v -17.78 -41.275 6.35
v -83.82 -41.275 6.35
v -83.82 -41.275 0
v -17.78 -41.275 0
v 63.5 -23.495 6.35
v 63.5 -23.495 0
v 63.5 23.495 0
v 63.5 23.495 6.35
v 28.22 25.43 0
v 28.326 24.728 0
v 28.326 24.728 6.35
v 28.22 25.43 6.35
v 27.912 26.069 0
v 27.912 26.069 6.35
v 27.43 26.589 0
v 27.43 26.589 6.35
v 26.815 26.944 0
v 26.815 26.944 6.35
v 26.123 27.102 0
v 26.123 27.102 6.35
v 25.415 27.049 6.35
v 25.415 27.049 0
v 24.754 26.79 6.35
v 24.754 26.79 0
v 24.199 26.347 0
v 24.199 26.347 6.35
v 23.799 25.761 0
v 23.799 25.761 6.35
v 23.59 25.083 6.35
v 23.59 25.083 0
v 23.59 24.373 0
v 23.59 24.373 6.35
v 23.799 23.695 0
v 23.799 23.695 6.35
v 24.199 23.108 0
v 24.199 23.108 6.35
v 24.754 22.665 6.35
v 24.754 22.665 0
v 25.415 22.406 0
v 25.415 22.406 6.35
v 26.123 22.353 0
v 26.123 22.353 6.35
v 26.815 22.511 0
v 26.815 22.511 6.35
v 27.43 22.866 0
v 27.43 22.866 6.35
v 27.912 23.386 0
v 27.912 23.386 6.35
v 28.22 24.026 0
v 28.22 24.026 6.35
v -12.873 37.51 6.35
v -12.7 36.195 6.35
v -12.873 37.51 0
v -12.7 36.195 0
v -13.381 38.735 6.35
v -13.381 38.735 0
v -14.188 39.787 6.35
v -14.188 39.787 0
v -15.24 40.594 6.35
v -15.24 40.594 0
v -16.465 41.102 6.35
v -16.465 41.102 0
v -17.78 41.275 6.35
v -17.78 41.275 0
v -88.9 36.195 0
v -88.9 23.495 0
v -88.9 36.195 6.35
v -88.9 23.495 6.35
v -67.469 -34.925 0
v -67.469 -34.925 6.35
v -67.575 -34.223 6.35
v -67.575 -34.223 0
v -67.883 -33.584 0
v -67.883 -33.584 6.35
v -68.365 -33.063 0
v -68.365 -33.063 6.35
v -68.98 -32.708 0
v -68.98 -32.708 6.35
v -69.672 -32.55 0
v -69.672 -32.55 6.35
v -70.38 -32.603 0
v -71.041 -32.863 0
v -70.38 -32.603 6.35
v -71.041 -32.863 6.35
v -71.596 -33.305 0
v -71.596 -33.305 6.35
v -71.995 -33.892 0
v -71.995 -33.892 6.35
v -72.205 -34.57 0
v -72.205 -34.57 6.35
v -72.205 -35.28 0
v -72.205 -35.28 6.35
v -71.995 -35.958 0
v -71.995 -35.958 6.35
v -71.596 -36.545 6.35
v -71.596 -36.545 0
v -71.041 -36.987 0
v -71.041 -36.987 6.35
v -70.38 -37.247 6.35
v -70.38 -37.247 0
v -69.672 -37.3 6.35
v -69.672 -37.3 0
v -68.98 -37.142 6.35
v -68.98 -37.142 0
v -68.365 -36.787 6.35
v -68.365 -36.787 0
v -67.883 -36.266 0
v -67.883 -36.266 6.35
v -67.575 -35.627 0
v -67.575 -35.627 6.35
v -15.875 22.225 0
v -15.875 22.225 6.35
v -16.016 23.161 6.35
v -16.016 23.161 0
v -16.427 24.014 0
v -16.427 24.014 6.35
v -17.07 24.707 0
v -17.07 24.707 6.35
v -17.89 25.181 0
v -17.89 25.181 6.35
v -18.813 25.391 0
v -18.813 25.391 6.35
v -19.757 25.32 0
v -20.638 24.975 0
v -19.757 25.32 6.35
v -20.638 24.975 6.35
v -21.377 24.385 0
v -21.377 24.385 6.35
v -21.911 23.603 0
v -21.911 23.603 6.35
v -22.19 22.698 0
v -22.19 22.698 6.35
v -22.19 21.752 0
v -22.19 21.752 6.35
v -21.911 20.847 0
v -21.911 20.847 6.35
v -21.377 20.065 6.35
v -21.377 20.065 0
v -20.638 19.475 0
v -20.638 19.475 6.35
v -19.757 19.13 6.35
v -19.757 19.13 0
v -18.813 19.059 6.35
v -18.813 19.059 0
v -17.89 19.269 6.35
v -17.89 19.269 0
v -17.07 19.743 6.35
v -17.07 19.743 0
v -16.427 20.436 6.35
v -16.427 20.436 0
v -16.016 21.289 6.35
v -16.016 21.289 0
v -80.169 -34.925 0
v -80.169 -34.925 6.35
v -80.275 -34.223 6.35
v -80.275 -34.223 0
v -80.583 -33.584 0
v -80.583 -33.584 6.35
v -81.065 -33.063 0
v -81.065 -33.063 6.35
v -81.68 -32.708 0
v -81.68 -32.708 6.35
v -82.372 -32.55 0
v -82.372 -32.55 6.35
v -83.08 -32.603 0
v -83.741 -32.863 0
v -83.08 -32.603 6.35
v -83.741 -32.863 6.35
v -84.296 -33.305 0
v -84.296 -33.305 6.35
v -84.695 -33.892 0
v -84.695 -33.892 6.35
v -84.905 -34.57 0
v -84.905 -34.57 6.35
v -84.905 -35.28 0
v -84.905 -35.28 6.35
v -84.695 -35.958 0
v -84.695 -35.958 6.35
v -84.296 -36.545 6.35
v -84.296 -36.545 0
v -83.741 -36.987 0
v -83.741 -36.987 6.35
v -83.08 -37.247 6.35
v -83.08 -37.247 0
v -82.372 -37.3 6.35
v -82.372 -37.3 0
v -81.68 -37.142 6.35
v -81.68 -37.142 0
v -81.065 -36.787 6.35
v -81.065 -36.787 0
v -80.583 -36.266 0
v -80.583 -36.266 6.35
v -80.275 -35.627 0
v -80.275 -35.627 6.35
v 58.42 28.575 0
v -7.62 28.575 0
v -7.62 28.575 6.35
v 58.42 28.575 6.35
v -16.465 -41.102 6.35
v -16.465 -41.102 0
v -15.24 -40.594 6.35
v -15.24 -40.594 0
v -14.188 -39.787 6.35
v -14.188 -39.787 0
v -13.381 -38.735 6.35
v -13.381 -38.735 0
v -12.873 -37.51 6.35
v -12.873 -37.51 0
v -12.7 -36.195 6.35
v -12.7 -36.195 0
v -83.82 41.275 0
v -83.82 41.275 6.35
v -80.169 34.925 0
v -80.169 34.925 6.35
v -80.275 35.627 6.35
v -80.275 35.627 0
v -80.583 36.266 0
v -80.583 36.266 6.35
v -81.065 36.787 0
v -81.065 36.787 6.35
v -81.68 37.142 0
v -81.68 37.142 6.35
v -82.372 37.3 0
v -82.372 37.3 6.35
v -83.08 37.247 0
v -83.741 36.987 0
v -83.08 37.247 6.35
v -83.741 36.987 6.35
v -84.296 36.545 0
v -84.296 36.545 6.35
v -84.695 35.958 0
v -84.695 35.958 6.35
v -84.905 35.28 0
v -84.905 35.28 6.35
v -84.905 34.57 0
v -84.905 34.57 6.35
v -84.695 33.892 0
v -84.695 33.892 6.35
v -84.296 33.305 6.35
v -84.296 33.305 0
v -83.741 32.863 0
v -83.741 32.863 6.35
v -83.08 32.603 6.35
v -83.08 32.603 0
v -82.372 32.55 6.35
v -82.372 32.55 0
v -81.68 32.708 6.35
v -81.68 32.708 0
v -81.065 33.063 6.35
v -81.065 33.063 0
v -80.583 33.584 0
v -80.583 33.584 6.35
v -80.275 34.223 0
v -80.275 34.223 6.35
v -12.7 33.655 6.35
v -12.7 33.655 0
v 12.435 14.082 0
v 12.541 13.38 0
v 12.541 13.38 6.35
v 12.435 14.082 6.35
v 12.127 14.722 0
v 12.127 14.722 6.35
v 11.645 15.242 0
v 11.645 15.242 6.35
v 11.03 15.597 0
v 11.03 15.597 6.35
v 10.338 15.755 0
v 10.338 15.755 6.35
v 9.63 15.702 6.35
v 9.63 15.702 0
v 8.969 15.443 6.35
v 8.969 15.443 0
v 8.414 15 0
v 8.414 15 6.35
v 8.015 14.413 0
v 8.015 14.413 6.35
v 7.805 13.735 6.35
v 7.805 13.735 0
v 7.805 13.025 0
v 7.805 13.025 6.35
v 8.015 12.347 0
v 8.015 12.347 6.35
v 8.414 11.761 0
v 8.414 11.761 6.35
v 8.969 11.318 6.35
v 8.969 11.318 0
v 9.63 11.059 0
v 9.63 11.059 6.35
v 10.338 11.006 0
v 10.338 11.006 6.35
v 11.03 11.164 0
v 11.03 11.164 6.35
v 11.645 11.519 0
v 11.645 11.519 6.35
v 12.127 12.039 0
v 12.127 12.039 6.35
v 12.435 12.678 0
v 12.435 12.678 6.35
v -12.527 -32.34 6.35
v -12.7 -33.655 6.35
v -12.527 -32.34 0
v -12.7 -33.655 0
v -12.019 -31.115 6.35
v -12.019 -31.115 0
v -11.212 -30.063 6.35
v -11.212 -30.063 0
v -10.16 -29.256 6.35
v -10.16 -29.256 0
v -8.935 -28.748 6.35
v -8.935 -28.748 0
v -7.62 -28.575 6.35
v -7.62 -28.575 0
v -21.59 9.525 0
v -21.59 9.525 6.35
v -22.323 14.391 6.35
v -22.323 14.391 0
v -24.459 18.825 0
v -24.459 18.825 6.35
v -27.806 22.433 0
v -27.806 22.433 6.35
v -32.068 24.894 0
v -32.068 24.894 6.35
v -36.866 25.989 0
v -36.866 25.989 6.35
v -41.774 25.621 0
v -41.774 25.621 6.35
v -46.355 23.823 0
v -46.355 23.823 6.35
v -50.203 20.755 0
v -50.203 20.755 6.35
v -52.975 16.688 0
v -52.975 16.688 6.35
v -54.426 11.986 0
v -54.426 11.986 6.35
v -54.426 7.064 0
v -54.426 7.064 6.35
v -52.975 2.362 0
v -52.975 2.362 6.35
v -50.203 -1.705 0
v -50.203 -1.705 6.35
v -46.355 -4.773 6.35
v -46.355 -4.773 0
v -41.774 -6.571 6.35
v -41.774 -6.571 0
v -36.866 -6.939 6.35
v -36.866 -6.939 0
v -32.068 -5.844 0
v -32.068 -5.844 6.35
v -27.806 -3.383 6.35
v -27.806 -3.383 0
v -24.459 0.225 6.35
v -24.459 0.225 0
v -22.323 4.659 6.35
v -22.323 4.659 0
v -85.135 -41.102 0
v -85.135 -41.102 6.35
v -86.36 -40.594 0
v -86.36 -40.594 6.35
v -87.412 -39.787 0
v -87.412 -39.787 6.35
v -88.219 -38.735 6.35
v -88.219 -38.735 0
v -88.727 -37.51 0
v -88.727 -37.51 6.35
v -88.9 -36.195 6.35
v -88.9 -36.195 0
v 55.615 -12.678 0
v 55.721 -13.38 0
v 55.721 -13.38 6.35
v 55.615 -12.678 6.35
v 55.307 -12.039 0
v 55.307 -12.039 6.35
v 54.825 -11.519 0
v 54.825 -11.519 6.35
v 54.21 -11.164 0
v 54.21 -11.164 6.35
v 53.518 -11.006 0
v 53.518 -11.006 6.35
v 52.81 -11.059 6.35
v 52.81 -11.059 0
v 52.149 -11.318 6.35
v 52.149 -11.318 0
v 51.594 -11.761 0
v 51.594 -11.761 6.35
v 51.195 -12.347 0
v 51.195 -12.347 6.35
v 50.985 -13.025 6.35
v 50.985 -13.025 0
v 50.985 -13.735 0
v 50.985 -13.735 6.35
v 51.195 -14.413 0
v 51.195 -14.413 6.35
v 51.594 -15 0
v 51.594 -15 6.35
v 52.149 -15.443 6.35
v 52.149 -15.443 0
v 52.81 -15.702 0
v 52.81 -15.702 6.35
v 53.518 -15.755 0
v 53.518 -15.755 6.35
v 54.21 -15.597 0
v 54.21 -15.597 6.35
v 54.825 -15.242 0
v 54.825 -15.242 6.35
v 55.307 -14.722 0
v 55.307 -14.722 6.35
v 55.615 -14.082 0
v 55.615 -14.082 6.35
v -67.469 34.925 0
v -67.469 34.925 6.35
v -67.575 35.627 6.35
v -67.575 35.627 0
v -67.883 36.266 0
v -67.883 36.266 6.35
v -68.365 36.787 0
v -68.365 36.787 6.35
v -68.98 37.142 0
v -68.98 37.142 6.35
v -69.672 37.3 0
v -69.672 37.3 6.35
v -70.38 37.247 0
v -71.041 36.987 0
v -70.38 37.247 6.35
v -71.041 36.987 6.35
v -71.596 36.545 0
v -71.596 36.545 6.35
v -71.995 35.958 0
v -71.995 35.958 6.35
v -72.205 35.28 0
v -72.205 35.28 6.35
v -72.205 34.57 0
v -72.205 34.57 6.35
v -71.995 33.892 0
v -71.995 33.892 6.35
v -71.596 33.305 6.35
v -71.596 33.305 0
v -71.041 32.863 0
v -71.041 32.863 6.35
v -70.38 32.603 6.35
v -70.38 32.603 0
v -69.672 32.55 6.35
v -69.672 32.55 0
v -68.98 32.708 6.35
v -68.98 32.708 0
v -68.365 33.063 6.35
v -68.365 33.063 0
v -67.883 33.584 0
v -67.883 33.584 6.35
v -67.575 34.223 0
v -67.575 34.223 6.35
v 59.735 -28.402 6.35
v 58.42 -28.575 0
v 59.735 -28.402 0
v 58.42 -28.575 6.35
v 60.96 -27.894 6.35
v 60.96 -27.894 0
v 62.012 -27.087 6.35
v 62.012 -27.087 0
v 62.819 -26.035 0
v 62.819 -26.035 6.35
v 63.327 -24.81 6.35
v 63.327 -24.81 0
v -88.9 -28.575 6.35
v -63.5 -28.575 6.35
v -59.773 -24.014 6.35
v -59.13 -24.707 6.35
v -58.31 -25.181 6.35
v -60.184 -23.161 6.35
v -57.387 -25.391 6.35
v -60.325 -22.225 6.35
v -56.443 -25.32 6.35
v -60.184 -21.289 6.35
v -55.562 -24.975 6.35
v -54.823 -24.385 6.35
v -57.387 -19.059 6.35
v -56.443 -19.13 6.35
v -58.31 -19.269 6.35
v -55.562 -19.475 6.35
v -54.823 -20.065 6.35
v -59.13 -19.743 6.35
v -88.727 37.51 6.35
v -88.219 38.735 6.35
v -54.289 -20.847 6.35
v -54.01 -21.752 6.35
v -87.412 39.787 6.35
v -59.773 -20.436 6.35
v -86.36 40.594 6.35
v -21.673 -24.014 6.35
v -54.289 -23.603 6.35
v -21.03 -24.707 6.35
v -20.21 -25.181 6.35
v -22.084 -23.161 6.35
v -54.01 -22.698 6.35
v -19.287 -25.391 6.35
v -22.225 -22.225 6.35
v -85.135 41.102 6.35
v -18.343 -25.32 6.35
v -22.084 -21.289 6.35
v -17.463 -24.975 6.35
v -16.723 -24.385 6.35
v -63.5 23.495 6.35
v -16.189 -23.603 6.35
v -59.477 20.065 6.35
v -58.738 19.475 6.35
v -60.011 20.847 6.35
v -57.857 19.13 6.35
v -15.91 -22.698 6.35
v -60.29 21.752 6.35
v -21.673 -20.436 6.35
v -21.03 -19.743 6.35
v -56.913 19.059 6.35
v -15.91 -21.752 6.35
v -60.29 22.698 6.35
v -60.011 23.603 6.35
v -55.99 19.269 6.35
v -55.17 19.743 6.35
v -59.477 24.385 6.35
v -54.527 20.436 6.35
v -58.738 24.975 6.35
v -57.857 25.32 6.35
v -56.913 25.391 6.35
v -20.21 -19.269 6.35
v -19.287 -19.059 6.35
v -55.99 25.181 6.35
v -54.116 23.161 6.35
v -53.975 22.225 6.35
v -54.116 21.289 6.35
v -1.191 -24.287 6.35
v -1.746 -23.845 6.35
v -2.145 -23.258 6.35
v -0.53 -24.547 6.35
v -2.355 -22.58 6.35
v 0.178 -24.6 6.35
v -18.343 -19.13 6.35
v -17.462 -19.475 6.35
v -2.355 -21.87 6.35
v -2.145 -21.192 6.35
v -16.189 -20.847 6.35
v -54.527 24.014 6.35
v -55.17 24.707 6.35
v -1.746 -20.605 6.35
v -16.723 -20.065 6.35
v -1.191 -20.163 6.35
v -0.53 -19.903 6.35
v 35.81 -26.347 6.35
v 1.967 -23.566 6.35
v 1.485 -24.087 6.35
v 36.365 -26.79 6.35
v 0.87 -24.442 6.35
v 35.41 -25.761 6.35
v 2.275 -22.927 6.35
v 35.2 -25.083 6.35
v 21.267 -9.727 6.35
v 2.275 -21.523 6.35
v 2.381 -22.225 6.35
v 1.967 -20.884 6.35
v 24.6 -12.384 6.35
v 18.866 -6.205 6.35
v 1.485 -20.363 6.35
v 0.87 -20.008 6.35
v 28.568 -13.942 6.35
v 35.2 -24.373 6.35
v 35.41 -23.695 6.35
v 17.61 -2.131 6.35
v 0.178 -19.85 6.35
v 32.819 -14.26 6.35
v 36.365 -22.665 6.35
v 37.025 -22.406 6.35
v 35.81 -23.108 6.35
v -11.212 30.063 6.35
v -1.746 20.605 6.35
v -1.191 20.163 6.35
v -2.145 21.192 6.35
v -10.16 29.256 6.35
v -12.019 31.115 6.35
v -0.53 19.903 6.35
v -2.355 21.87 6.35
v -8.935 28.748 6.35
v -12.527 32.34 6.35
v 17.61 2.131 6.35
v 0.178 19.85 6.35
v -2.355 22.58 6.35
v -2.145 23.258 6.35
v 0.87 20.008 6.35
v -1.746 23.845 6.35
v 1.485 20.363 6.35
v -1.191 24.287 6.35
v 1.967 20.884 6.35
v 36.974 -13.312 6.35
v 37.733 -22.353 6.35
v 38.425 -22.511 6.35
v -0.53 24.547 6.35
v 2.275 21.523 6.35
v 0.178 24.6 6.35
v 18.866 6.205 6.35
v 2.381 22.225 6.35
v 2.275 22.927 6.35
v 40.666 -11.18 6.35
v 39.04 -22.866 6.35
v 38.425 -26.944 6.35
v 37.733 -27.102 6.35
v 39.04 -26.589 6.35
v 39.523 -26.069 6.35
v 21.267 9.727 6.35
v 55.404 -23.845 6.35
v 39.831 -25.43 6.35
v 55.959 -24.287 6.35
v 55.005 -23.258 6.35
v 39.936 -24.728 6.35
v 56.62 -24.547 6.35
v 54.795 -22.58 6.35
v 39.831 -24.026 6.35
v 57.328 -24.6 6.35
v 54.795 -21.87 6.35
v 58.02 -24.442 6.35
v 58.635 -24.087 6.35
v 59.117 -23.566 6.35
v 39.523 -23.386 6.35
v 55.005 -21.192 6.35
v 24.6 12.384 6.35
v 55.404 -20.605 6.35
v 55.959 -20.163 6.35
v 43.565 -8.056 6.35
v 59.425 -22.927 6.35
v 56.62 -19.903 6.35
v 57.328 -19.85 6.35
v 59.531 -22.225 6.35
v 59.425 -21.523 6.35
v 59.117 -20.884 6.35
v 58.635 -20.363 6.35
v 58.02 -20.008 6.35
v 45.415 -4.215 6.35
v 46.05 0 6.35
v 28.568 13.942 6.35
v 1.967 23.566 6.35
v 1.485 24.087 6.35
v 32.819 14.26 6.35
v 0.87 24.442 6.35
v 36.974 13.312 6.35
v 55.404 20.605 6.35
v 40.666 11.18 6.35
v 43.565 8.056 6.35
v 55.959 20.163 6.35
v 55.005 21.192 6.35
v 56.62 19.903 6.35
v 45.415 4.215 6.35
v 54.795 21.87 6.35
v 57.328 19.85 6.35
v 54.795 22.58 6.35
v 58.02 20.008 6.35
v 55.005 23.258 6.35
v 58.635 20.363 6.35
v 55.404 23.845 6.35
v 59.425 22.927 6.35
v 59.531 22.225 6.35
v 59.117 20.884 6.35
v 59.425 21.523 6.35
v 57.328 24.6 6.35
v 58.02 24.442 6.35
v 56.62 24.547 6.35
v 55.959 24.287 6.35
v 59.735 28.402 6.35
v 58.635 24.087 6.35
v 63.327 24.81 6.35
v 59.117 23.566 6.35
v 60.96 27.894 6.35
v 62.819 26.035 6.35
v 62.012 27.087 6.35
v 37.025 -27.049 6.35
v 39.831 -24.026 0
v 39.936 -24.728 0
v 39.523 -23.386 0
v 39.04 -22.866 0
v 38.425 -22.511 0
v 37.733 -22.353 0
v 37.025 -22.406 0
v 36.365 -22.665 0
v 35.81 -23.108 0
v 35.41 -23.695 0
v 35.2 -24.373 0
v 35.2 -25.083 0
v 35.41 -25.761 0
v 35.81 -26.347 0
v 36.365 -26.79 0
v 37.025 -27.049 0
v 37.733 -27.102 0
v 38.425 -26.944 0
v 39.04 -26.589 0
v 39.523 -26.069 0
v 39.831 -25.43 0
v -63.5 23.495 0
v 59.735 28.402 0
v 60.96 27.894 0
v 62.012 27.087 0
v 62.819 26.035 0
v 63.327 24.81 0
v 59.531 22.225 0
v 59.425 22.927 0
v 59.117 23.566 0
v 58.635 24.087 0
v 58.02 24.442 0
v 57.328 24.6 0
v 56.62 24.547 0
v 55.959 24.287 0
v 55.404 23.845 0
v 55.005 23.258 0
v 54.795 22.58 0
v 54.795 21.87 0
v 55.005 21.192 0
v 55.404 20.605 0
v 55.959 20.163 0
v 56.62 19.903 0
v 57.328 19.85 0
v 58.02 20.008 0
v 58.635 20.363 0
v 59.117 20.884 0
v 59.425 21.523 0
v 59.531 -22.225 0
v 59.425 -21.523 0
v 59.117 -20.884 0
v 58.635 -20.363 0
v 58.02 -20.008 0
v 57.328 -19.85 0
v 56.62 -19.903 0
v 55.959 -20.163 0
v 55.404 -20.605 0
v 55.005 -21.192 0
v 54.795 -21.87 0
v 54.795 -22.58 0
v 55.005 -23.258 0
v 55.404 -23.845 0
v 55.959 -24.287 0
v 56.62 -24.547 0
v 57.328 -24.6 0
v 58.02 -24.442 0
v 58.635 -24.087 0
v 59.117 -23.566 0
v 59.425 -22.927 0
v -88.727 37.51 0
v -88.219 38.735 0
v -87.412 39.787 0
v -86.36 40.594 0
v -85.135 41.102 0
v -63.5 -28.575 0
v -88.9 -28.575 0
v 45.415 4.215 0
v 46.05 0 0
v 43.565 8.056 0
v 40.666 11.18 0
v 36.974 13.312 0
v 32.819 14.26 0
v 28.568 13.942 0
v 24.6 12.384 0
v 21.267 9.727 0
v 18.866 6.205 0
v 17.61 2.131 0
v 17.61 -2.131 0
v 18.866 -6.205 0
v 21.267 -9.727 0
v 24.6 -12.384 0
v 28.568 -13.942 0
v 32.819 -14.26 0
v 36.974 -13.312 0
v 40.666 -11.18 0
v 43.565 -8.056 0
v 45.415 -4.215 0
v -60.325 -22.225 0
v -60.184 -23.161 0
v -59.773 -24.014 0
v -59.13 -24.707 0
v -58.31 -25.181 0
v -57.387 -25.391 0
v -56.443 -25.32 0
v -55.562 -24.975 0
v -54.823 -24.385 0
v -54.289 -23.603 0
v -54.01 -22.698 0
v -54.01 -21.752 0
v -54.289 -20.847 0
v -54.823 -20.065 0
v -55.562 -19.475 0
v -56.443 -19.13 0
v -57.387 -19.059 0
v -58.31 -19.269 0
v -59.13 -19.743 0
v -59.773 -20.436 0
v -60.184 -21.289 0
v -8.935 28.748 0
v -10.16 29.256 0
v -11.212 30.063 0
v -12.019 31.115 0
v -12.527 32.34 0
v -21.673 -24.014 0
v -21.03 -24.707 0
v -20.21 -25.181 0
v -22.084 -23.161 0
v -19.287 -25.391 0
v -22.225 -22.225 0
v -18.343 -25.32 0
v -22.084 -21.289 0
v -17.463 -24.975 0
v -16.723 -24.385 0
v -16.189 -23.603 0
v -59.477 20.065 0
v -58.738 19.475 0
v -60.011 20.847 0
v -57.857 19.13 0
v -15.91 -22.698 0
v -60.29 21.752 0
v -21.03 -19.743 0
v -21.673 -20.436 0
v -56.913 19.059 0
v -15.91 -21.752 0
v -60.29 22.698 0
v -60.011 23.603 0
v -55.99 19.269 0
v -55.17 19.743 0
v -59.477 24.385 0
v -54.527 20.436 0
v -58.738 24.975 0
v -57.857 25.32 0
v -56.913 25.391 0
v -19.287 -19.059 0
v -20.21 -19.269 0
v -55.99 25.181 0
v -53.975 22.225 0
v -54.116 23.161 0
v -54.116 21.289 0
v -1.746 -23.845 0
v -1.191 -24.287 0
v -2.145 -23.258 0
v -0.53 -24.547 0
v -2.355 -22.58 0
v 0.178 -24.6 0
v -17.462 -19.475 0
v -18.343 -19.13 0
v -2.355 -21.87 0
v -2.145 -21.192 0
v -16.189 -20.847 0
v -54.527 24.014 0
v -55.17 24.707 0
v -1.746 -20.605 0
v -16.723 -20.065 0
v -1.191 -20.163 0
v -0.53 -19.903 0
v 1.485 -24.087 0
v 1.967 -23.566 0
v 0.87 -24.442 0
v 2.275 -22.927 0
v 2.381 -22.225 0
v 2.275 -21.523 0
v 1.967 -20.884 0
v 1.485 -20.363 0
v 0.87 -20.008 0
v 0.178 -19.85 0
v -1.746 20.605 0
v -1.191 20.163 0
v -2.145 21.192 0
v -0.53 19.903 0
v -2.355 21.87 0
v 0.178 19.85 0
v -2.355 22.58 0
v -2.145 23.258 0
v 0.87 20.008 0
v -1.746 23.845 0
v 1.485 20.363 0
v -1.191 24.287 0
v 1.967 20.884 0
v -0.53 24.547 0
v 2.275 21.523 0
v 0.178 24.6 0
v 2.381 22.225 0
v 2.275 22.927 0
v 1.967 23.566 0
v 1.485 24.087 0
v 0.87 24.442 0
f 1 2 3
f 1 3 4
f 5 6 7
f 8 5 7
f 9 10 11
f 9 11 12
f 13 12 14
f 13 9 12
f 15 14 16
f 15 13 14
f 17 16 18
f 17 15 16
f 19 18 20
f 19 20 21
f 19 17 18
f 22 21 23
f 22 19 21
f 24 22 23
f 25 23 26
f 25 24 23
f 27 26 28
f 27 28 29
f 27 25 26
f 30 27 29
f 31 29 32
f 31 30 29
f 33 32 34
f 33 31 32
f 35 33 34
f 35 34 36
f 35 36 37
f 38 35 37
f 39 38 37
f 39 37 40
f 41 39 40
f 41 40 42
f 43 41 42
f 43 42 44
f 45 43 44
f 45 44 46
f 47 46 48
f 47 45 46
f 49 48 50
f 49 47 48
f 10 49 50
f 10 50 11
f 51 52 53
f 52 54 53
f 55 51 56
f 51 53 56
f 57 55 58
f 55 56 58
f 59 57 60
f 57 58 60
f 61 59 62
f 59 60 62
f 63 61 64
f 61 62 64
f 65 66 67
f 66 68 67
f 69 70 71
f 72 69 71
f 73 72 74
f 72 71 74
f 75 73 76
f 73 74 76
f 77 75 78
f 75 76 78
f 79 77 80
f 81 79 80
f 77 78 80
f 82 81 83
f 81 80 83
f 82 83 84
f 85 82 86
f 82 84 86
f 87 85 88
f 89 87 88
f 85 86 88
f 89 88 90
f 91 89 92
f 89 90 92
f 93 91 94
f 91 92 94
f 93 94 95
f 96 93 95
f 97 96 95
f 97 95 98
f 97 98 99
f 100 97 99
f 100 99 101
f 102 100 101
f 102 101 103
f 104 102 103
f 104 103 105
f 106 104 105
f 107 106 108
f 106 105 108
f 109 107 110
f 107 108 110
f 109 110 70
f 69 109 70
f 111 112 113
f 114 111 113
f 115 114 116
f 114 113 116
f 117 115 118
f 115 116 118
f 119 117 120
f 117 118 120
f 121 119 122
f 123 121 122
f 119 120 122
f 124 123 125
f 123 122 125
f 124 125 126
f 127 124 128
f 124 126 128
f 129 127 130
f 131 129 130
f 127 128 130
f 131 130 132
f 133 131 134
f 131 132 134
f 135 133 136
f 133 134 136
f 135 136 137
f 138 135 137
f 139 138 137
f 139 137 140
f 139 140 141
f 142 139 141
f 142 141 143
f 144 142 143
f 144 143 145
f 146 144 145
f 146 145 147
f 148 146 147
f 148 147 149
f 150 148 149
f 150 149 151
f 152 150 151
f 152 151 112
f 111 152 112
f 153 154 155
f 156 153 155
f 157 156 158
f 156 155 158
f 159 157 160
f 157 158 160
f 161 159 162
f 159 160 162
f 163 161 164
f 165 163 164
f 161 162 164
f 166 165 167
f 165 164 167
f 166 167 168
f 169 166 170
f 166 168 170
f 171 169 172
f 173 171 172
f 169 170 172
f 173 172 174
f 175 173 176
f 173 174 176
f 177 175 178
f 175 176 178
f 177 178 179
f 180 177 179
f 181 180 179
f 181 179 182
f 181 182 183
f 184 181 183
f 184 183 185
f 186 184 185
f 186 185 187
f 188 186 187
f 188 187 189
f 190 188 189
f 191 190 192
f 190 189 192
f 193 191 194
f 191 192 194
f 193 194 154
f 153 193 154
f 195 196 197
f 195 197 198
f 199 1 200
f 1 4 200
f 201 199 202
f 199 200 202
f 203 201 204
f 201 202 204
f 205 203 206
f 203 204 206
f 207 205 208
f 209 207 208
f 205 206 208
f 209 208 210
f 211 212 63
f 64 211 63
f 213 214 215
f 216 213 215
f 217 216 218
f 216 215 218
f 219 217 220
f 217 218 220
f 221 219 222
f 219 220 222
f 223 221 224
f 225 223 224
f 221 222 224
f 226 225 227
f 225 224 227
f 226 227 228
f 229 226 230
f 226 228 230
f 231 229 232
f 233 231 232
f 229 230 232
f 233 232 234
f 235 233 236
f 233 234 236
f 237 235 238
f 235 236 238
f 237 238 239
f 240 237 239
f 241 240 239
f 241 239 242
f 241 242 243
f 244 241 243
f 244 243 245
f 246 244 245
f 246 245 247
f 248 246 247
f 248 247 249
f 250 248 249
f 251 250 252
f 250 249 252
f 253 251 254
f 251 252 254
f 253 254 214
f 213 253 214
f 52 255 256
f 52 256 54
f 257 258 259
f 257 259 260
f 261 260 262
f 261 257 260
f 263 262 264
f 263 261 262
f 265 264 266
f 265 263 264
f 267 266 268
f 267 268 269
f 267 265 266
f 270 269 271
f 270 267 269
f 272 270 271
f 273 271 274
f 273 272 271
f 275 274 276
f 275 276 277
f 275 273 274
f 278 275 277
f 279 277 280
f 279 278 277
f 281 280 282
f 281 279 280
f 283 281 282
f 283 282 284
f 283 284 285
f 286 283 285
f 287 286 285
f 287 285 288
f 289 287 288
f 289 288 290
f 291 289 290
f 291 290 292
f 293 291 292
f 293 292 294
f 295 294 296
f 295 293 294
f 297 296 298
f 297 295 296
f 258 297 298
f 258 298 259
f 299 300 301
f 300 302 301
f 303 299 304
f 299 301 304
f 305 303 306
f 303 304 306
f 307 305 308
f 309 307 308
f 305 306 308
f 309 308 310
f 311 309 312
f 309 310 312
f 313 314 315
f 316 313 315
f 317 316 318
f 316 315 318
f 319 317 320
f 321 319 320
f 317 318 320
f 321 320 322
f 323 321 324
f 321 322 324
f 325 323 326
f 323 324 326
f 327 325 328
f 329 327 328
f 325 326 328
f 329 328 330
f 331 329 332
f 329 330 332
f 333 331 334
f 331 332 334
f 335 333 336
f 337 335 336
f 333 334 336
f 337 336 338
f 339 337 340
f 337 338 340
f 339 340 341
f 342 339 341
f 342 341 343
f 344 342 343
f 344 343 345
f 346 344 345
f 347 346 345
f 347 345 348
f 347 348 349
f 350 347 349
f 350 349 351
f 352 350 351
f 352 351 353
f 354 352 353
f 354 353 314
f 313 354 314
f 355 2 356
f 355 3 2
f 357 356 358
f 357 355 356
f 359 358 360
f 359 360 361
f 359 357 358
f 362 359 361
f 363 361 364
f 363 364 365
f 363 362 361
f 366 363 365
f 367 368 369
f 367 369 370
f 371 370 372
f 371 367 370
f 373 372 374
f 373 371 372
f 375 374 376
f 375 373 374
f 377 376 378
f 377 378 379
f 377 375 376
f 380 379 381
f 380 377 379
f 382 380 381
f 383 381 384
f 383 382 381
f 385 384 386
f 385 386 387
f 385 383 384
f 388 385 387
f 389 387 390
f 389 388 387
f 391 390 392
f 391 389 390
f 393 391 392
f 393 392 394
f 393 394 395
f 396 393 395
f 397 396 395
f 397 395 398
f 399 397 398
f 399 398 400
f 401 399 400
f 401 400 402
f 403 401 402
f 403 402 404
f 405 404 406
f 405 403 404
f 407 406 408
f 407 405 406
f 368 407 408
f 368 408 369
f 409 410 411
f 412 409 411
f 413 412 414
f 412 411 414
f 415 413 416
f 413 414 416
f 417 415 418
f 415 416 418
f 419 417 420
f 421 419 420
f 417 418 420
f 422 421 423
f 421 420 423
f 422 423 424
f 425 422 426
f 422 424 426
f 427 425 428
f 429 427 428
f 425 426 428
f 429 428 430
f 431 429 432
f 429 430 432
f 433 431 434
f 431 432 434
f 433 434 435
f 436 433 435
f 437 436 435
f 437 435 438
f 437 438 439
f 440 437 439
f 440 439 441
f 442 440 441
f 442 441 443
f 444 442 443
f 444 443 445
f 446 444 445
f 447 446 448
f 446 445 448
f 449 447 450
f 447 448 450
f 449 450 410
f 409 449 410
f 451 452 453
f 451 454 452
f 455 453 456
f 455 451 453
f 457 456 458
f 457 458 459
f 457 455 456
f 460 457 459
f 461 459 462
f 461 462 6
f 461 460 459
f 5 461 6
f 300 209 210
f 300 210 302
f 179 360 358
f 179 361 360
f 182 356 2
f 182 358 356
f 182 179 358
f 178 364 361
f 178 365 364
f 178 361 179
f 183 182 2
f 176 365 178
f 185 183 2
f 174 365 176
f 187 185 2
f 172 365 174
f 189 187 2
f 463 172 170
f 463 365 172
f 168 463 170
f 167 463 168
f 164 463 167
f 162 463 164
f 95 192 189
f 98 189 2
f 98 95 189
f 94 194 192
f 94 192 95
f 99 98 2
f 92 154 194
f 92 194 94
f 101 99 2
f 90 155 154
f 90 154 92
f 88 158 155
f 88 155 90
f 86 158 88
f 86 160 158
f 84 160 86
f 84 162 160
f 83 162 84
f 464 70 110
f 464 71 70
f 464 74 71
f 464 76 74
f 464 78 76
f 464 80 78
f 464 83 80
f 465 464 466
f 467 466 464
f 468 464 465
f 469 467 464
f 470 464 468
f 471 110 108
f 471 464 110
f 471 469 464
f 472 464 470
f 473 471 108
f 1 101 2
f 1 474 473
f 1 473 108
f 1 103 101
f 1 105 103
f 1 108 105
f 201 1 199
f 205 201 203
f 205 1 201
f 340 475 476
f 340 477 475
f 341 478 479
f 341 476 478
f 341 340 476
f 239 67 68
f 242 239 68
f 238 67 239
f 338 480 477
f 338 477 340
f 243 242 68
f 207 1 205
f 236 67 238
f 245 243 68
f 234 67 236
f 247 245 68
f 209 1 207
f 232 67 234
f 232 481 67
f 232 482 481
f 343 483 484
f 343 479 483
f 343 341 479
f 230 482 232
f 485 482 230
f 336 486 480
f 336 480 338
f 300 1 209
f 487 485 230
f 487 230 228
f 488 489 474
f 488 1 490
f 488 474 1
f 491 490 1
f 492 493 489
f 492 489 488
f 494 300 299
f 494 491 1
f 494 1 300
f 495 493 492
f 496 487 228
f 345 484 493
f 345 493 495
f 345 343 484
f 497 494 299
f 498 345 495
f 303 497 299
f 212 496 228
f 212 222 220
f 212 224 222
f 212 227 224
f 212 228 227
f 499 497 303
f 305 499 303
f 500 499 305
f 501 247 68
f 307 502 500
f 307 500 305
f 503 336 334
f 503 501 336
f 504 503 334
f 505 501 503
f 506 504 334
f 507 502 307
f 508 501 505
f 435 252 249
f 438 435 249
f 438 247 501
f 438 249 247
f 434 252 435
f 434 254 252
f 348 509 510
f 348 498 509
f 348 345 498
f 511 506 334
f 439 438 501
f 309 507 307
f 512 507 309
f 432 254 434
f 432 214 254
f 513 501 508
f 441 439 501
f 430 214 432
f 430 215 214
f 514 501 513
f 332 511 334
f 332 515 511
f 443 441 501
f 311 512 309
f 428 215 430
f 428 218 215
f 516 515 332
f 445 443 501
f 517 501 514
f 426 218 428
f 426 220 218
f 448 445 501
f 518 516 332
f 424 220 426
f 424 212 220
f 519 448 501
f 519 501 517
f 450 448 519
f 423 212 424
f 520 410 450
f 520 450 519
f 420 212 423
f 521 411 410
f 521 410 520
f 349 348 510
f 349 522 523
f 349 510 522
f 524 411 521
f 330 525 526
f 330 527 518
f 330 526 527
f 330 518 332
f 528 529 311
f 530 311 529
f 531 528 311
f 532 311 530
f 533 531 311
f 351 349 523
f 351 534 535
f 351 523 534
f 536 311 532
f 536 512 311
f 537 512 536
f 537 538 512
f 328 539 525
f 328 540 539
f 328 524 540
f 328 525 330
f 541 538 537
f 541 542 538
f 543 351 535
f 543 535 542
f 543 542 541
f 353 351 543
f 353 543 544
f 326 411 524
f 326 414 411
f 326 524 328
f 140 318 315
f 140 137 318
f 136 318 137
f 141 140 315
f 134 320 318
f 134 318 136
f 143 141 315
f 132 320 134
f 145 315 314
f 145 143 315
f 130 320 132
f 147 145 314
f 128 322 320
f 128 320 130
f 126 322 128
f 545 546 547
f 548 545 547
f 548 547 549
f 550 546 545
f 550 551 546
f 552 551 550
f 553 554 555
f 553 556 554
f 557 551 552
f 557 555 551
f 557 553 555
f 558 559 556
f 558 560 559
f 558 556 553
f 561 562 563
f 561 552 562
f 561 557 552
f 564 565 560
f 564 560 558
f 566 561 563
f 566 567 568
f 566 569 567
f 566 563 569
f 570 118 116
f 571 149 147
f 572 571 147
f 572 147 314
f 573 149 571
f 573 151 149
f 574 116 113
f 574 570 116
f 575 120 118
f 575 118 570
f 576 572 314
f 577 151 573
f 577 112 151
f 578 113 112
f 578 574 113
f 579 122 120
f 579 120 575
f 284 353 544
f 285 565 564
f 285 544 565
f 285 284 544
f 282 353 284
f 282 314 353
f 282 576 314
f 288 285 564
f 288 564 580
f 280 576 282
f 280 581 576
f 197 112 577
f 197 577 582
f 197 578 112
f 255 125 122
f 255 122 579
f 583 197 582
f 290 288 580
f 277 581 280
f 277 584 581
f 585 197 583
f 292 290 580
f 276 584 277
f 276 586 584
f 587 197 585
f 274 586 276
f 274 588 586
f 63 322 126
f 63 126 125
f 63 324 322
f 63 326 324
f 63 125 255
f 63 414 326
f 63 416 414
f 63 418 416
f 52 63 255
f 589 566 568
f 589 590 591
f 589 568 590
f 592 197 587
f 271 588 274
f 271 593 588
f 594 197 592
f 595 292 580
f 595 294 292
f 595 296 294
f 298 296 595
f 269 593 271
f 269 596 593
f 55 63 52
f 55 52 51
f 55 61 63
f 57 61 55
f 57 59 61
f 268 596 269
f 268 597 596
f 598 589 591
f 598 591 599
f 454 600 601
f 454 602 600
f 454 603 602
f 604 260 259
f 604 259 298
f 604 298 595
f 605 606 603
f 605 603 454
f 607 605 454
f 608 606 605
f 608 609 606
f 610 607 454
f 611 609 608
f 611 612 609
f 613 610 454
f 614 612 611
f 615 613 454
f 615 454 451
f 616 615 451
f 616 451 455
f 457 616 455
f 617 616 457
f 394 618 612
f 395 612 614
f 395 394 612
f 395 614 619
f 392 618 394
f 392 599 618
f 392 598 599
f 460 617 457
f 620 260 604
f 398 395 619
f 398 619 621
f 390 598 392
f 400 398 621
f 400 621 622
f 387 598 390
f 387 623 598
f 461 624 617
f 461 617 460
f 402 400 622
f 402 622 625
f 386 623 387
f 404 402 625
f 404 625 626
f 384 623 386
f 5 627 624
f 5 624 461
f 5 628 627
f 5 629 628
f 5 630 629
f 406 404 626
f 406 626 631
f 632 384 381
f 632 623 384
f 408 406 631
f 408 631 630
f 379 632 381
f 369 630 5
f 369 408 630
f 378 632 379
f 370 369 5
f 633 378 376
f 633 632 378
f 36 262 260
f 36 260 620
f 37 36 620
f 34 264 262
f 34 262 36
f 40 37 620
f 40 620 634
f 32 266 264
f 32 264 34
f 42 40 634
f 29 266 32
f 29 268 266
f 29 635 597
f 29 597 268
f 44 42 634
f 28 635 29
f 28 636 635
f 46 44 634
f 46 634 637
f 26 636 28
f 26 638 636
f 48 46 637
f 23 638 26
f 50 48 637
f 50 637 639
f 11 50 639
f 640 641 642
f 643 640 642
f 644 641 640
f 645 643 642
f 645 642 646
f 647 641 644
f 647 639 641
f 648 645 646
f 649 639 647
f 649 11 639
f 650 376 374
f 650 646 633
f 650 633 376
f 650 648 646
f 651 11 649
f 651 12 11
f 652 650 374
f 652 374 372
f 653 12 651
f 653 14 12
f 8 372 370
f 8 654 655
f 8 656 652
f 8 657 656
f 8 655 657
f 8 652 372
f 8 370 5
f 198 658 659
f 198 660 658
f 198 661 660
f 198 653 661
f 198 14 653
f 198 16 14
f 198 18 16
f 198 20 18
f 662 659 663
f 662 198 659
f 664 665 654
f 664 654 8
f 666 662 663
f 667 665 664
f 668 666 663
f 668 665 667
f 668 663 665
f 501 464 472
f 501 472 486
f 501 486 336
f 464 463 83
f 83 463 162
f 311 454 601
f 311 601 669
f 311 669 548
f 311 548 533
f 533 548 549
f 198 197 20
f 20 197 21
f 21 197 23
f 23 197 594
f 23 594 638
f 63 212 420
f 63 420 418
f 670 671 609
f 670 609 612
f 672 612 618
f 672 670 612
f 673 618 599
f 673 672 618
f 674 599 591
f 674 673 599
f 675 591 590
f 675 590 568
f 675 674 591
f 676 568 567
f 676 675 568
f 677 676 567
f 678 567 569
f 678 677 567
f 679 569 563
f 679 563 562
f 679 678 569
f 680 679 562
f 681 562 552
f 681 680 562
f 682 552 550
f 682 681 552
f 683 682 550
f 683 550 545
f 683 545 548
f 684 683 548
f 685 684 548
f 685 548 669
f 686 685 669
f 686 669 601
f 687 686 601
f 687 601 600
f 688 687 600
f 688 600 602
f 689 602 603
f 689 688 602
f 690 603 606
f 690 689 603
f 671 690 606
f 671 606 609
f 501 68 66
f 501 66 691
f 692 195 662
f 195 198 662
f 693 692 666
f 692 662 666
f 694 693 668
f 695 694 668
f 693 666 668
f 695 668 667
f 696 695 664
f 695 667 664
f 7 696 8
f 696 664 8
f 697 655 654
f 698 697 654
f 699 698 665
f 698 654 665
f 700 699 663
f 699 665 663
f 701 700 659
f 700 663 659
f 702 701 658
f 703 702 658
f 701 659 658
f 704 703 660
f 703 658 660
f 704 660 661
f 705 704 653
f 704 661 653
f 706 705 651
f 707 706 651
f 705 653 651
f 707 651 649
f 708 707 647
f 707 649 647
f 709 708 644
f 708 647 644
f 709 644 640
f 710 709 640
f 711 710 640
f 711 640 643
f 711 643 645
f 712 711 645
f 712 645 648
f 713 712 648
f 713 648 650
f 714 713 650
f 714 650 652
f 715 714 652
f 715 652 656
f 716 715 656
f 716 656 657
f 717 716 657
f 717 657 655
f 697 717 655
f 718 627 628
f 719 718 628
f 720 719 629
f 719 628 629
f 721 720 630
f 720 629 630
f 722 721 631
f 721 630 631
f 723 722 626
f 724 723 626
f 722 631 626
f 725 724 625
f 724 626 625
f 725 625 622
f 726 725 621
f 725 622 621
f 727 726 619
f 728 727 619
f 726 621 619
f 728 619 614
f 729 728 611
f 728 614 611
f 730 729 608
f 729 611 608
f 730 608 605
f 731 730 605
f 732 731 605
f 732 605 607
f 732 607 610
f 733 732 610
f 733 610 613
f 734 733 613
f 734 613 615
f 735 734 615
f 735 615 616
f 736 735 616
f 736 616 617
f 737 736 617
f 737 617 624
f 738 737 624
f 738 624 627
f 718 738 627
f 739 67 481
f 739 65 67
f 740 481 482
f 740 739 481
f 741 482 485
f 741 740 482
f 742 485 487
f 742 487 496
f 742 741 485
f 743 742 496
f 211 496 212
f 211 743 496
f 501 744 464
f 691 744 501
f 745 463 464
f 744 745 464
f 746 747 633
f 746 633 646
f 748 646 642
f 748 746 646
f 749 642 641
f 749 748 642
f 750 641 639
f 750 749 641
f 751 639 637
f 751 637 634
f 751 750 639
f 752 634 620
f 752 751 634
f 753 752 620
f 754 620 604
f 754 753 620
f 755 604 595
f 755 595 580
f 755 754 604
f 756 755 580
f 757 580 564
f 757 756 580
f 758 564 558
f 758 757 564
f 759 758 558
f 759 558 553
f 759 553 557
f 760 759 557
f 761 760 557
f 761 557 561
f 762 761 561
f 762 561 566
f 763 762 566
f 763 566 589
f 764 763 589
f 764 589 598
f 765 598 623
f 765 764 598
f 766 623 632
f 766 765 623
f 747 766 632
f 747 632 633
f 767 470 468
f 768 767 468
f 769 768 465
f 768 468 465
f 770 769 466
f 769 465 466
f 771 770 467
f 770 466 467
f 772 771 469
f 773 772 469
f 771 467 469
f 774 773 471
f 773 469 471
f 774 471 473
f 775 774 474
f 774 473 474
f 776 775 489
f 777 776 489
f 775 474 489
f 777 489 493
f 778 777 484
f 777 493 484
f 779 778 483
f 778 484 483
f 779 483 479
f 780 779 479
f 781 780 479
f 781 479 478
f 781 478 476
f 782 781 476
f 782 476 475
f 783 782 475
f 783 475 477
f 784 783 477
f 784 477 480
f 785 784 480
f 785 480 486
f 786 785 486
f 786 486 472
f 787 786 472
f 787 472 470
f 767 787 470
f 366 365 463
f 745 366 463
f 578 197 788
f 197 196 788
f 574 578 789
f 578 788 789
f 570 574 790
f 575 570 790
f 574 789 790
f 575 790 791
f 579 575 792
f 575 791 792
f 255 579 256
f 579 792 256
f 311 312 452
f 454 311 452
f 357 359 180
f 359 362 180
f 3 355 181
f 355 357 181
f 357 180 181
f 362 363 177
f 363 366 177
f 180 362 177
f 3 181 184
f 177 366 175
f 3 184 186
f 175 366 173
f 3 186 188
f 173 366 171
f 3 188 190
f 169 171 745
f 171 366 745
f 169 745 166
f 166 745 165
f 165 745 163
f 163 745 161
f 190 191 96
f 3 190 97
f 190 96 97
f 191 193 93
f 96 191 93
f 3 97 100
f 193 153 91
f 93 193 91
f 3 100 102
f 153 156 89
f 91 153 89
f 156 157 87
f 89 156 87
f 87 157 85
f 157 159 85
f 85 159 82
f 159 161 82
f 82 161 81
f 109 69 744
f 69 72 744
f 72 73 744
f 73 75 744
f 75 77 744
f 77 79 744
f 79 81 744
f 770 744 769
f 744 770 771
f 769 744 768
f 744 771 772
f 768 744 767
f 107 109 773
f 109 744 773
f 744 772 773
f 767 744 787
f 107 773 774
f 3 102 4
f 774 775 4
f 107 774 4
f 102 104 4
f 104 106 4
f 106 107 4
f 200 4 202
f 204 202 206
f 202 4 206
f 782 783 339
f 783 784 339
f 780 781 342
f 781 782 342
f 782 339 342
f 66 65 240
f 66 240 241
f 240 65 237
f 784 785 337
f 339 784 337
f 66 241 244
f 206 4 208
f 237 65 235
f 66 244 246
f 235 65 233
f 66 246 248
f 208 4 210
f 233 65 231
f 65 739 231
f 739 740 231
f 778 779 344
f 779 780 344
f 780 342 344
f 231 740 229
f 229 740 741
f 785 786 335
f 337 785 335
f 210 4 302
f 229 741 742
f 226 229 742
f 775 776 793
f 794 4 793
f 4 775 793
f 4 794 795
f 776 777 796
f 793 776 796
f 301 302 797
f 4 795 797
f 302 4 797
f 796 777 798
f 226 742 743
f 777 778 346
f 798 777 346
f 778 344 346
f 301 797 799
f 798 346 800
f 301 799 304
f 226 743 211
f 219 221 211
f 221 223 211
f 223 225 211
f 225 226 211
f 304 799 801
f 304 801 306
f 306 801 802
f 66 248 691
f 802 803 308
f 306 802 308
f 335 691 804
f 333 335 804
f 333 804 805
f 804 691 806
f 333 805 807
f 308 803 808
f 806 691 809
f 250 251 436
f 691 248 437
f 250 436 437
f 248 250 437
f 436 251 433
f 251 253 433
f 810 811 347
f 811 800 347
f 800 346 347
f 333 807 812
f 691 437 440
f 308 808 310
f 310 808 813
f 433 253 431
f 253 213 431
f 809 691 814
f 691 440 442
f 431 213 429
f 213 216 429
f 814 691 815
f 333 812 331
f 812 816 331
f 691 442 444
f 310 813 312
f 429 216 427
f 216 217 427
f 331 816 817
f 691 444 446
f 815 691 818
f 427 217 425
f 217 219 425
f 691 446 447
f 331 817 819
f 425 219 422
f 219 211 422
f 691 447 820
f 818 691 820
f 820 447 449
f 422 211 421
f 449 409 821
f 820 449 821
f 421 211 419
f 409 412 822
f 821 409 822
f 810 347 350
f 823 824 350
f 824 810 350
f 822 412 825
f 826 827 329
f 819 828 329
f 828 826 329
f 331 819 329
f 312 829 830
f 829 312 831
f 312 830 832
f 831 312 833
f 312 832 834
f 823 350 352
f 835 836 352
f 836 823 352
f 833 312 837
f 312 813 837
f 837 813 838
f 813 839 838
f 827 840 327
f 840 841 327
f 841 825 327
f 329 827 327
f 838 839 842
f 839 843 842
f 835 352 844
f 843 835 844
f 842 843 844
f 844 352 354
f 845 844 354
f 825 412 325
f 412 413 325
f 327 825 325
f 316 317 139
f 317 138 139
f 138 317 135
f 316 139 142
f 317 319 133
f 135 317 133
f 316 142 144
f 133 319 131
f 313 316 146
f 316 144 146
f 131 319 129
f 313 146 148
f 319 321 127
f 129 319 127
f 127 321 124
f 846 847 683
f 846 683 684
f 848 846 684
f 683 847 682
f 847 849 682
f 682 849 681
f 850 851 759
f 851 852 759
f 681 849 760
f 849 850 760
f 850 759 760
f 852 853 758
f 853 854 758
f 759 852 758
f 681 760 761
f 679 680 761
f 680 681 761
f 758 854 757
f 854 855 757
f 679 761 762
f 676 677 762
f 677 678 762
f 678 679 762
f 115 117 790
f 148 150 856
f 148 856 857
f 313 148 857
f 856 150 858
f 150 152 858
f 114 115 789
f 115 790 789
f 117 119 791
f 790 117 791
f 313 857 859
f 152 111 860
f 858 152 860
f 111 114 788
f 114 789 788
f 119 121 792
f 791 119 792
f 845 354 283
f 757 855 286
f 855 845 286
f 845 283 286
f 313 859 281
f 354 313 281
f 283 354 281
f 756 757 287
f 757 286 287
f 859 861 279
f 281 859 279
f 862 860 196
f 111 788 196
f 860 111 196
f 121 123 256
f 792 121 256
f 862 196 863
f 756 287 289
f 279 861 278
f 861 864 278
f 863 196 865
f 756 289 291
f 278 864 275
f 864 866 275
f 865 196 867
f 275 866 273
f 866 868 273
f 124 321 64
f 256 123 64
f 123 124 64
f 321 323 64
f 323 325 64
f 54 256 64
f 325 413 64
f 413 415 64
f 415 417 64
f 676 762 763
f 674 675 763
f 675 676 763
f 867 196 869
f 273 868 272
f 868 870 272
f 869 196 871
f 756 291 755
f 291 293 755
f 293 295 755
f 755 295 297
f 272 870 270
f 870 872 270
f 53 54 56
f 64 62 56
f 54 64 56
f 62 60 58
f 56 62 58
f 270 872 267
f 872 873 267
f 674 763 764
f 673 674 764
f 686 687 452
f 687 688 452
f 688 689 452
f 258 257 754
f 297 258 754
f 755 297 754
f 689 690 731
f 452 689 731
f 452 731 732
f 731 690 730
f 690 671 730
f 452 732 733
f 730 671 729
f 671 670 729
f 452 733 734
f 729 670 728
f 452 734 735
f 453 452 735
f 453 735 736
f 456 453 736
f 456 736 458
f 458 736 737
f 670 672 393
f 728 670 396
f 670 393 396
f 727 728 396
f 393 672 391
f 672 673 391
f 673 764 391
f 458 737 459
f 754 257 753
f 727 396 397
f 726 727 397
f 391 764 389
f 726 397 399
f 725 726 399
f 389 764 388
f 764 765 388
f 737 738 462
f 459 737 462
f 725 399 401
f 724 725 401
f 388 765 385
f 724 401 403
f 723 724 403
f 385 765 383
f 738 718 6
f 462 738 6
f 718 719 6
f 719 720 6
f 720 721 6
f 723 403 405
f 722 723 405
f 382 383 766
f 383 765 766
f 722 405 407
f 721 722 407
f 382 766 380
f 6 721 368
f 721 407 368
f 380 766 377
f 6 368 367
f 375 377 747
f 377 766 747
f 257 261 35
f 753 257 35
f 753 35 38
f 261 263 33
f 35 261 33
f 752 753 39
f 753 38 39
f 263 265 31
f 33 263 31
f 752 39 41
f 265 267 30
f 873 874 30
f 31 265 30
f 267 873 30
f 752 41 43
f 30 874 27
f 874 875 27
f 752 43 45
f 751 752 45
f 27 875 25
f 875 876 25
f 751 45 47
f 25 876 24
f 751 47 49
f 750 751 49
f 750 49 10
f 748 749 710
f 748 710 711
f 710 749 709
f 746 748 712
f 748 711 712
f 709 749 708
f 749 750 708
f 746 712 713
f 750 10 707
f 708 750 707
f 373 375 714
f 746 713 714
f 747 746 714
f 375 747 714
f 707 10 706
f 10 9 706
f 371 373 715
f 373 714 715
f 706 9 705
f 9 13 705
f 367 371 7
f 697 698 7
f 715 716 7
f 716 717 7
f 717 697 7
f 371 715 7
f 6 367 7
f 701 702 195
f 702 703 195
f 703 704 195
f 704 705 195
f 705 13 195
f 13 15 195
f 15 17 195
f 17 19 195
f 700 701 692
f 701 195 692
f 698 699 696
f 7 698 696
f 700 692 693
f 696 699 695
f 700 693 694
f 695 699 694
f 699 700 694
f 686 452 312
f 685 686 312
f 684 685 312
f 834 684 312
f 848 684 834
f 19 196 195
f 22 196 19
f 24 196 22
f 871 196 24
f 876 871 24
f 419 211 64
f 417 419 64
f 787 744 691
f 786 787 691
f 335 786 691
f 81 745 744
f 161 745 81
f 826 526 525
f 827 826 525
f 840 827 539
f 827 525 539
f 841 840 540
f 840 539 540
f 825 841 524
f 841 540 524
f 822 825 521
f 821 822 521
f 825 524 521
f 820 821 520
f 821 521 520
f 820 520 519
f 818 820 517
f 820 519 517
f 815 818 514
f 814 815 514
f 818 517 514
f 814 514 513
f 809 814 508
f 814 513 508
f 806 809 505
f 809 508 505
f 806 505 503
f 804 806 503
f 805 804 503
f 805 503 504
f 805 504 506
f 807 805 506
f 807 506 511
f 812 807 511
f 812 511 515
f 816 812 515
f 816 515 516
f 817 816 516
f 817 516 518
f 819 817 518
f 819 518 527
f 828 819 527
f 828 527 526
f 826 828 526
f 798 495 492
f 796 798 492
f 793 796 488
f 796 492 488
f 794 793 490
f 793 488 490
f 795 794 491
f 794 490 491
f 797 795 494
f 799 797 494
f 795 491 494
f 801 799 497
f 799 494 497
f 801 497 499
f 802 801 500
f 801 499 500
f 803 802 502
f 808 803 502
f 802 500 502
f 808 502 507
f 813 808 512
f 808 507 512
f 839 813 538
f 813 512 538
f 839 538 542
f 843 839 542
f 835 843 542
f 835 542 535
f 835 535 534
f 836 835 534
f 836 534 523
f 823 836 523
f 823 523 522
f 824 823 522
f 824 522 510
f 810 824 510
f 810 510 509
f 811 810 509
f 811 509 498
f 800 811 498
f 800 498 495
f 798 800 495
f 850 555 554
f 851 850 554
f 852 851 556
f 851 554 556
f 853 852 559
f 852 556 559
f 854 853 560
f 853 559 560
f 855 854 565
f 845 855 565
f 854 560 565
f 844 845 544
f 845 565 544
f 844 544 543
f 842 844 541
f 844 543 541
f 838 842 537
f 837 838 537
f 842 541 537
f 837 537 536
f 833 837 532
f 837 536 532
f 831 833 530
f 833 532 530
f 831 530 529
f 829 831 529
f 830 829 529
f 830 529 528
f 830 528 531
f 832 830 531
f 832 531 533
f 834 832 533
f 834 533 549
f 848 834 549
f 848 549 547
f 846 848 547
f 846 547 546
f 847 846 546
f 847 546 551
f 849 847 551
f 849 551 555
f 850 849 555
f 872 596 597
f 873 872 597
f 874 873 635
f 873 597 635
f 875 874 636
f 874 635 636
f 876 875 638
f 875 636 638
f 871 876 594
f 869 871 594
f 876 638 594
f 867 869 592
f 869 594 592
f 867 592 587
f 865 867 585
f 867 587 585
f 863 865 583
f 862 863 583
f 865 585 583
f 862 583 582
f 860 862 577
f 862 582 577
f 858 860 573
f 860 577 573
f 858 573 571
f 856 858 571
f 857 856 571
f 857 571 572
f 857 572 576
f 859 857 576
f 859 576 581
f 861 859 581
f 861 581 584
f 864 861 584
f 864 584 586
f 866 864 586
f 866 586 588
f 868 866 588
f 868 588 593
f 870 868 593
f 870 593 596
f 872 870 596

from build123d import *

# Parameters (mm, degrees)
SKETCH1_W           = 127
SKETCH1_H           = 57.15
SKETCH1_R           = 14.3002
SKETCH1_R_2         = 2.38125
BOSS_EXTRUDE1_DEPTH = 6.35
SKETCH2_R           = 2.38125
CUT_EXTRUDE1_DEPTH  = 70.922121857
FILLET1_R           = 5.08
SKETCH3_R           = 3.175
CUT_EXTRUDE2_DEPTH  = 70.922121857
SKETCH4_R           = 16.51
CUT_EXTRUDE3_DEPTH  = 7.62
SKETCH5_W           = 76.2
SKETCH5_H           = 12.7
BOSS_EXTRUDE2_DEPTH = 6.35
FILLET2_R           = 5.08
SKETCH6_W           = 25.4
SKETCH6_H           = 5.08
BOSS_EXTRUDE3_DEPTH = 6.35
FILLET3_R           = 5.08
SKETCH7_R           = 2.38125
CUT_EXTRUDE4_DEPTH  = 6.35


with BuildPart() as part:
    # Sketch1 → Boss-Extrude1 (new body)
    with BuildSketch(Plane.XY):
        Rectangle(SKETCH1_W, SKETCH1_H)
        with Locations((31.75, 0)):
            Circle(SKETCH1_R, mode=Mode.SUBTRACT)
        with Locations((37.555148495, -24.727722316)):
            Circle(SKETCH1_R_2, mode=Mode.SUBTRACT)
        with Locations((10.16, 13.380280266)):
            Circle(SKETCH1_R_2, mode=Mode.SUBTRACT)
        with Locations((25.944851505, 24.727722316)):
            Circle(SKETCH1_R_2, mode=Mode.SUBTRACT)
        with Locations((53.34, -13.380280266)):
            Circle(SKETCH1_R_2, mode=Mode.SUBTRACT)
    extrude(amount=BOSS_EXTRUDE1_DEPTH)

    # Sketch2 → Cut-Extrude1 (cut, through all)
    with BuildSketch(Plane.XY.offset(6.35)):
        with Locations((57.15, 22.225)):
            Circle(SKETCH2_R)
        with Locations((57.15, -22.225)):
            Circle(SKETCH2_R)
        with Locations((0, 22.225)):
            Circle(SKETCH2_R)
        with Locations((0, -22.225)):
            Circle(SKETCH2_R)
    extrude(amount=-CUT_EXTRUDE1_DEPTH, mode=Mode.SUBTRACT)

    # Fillet1
    fillet1_edges = [part.edges().sort_by_distance(p)[0] for p in [
        (63.5, -28.575, 3.175),
        (63.5, 28.575, 3.175),
    ]]
    fillet(fillet1_edges, radius=FILLET1_R)

    # Sketch3 → Cut-Extrude2 (cut, through all)
    with BuildSketch(Plane.XY.offset(6.35)):
        with Locations((-57.15, 22.225)):
            Circle(SKETCH3_R)
        with Locations((-19.05, 22.225)):
            Circle(SKETCH3_R)
        with Locations(Location((-19.05, -22.225, 0), (0, 0, 180))):
            Circle(SKETCH3_R)
        with Locations(Location((-57.15, -22.225, 0), (0, 0, 180))):
            Circle(SKETCH3_R)
    extrude(amount=-CUT_EXTRUDE2_DEPTH, mode=Mode.SUBTRACT)

    # Sketch4 → Cut-Extrude3 (cut)
    with BuildSketch(Plane.XY.offset(6.35)):
        with Locations((-38.1, 9.525)):
            Circle(SKETCH4_R)
    extrude(amount=-CUT_EXTRUDE3_DEPTH, mode=Mode.SUBTRACT)

    # Sketch5 → Boss-Extrude2 (add)
    with BuildSketch(Plane.XY.offset(6.35)):
        with Locations((-50.8, -34.925)):
            Rectangle(SKETCH5_W, SKETCH5_H)
        with Locations((-50.8, 34.925)):
            Rectangle(SKETCH5_W, SKETCH5_H)
    extrude(amount=-BOSS_EXTRUDE2_DEPTH)

    # Fillet2
    fillet2_edges = [part.edges().sort_by_distance(p)[0] for p in [
        (-12.7, 41.275, 3.175),
        (-12.7, 28.575, 3.175),
        (-12.7, -28.575, 3.175),
        (-12.7, -41.275, 3.175),
    ]]
    fillet(fillet2_edges, radius=FILLET2_R)

    # Sketch6 → Boss-Extrude3 (add)
    with BuildSketch(Plane.XY.offset(6.35)):
        with Locations((-76.2, 26.035)):
            Rectangle(SKETCH6_W, SKETCH6_H)
    extrude(amount=-BOSS_EXTRUDE3_DEPTH)

    # Fillet3
    fillet3_edges = [part.edges().sort_by_distance(p)[0] for p in [
        (-88.9, 41.275, 3.175),
        (-88.9, -41.275, 3.175),
    ]]
    fillet(fillet3_edges, radius=FILLET3_R)

    # Sketch7 → Cut-Extrude4 (cut)
    with BuildSketch(Plane.XY.offset(6.35)):
        with Locations((-82.55, 34.925)):
            Circle(SKETCH7_R)
        with Locations((-82.55, -34.925)):
            Circle(SKETCH7_R)
        with Locations((-69.85, 34.925)):
            Circle(SKETCH7_R)
        with Locations((-69.85, -34.925)):
            Circle(SKETCH7_R)
    extrude(amount=-CUT_EXTRUDE4_DEPTH, mode=Mode.SUBTRACT)


solid = part.part
